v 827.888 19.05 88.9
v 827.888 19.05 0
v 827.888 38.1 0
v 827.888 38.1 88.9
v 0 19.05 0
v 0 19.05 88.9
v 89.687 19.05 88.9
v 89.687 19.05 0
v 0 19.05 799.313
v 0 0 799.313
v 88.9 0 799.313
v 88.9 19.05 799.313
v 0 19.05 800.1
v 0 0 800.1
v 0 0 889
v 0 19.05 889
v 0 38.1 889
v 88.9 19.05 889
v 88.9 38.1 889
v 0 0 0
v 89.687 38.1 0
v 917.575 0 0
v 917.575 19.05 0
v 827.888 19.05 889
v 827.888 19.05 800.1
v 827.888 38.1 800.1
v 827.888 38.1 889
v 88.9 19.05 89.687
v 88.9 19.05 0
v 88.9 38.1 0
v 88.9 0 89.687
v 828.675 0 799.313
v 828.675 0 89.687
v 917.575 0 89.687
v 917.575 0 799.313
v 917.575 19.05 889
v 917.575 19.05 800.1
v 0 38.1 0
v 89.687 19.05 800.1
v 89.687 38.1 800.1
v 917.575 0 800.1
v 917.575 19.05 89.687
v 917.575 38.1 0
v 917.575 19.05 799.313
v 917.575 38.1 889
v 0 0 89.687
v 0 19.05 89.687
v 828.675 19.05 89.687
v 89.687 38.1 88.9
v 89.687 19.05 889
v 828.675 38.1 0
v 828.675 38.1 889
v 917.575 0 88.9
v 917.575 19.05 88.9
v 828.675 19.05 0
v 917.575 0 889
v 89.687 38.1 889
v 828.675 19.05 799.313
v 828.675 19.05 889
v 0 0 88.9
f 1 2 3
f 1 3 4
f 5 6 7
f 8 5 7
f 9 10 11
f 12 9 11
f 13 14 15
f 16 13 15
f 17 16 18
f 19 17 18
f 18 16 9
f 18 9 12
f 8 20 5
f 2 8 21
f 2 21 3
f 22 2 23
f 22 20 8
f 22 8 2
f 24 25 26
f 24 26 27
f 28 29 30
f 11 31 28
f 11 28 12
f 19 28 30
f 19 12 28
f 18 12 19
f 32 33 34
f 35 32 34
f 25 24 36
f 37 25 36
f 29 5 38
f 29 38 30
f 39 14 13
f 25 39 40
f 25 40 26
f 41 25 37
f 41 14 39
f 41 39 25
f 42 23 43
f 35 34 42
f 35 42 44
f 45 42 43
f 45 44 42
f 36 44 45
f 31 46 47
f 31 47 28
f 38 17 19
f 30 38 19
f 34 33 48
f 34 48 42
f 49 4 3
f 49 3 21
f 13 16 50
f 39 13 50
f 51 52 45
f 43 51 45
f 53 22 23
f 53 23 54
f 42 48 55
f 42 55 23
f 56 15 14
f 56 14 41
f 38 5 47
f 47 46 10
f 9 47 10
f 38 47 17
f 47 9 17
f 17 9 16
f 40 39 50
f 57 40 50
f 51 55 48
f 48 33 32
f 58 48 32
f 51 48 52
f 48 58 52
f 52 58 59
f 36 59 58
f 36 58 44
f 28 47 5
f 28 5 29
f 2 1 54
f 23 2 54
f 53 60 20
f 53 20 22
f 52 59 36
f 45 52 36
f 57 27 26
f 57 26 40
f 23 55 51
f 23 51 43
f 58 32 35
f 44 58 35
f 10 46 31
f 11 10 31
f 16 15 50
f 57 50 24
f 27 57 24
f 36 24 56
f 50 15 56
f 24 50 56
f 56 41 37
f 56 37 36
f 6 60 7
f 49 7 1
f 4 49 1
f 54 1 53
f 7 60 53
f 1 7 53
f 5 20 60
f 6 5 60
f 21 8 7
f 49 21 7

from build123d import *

# Parameters (mm, degrees)
F0_W      = 88.9
F0_H      = 889
F1_DEPTH  = 38.1
F2_W      = 88.9
F2_H      = 89.6874
F3_DEPTH  = 19.05
F4_W      = 88.9
F4_H      = 89.6874
F5_DEPTH  = 19.05
F6_W      = 88.9
F6_H      = 889
F7_DEPTH  = 38.1
F8_W      = 88.9
F8_H      = 89.6874
F9_DEPTH  = 19.05
F10_W     = 917.575
F10_H     = 88.9
F11_DEPTH = 19.05
F12_W     = 738.2002
F12_H     = 88.9
F13_DEPTH = 19.05
F14_W     = 917.575
F14_H     = 88.9
F15_DEPTH = 19.05
F16_W     = 738.2002
F16_H     = 88.9
F17_DEPTH = 19.05


with BuildPart() as f1:
    # F0 (on Front) → F1 (new body)
    with BuildSketch(Plane.XZ):
        with Locations((44.45, 444.5)):
            Rectangle(F0_W, F0_H)
    extrude(amount=-F1_DEPTH)

    # F2 (on face) → F3 (cut)
    with BuildSketch(Plane.XZ):
        with Locations((44.45, 844.1563)):
            Rectangle(F2_W, F2_H)
    extrude(amount=-F3_DEPTH, mode=Mode.SUBTRACT)

    # F4 (on face) → F5 (cut)
    with BuildSketch(Plane.XZ):
        with Locations((44.45, 44.8437)):
            Rectangle(F4_W, F4_H)
    extrude(amount=-F5_DEPTH, mode=Mode.SUBTRACT)


with BuildPart() as f7:
    # F6 (on Front) → F7 (new body)
    with BuildSketch(Plane.XZ):
        with Locations((873.125, 444.5)):
            Rectangle(F6_W, F6_H)
    extrude(amount=-F7_DEPTH)

    # F8 (on face) → F9 (cut)
    with BuildSketch(Plane.XZ):
        with Locations((873.125, 844.1563)):
            Rectangle(F8_W, F8_H)
        with Locations((873.125, 44.8437)):
            Rectangle(F8_W, F8_H)
    extrude(amount=-F9_DEPTH, mode=Mode.SUBTRACT)


with BuildPart() as f11:
    # F10 (on Front) → F11 (new body)
    with BuildSketch(Plane.XZ):
        with Locations((458.7875, 844.55)):
            Rectangle(F10_W, F10_H)
    extrude(amount=-F11_DEPTH)

    # F12 (on face) → F13 (join)
    with BuildSketch(Plane(origin=(0, 19.05, 0), x_dir=(-1, 0, 0), z_dir=(0, 1, 0))):
        with Locations((-458.7875, 844.55)):
            Rectangle(F12_W, F12_H)
    extrude(amount=F13_DEPTH)


with BuildPart() as f15:
    # F14 (on Front) → F15 (new body)
    with BuildSketch(Plane.XZ):
        with Locations((458.7875, 44.45)):
            Rectangle(F14_W, F14_H)
    extrude(amount=-F15_DEPTH)

    # F16 (on face) → F17 (join)
    with BuildSketch(Plane(origin=(0, 19.05, 0), x_dir=(-1, 0, 0), z_dir=(0, 1, 0))):
        with Locations((-458.7875, 44.45)):
            Rectangle(F16_W, F16_H)
    extrude(amount=F17_DEPTH)


solid = Compound([f1.part, f7.part, f11.part, f15.part])
